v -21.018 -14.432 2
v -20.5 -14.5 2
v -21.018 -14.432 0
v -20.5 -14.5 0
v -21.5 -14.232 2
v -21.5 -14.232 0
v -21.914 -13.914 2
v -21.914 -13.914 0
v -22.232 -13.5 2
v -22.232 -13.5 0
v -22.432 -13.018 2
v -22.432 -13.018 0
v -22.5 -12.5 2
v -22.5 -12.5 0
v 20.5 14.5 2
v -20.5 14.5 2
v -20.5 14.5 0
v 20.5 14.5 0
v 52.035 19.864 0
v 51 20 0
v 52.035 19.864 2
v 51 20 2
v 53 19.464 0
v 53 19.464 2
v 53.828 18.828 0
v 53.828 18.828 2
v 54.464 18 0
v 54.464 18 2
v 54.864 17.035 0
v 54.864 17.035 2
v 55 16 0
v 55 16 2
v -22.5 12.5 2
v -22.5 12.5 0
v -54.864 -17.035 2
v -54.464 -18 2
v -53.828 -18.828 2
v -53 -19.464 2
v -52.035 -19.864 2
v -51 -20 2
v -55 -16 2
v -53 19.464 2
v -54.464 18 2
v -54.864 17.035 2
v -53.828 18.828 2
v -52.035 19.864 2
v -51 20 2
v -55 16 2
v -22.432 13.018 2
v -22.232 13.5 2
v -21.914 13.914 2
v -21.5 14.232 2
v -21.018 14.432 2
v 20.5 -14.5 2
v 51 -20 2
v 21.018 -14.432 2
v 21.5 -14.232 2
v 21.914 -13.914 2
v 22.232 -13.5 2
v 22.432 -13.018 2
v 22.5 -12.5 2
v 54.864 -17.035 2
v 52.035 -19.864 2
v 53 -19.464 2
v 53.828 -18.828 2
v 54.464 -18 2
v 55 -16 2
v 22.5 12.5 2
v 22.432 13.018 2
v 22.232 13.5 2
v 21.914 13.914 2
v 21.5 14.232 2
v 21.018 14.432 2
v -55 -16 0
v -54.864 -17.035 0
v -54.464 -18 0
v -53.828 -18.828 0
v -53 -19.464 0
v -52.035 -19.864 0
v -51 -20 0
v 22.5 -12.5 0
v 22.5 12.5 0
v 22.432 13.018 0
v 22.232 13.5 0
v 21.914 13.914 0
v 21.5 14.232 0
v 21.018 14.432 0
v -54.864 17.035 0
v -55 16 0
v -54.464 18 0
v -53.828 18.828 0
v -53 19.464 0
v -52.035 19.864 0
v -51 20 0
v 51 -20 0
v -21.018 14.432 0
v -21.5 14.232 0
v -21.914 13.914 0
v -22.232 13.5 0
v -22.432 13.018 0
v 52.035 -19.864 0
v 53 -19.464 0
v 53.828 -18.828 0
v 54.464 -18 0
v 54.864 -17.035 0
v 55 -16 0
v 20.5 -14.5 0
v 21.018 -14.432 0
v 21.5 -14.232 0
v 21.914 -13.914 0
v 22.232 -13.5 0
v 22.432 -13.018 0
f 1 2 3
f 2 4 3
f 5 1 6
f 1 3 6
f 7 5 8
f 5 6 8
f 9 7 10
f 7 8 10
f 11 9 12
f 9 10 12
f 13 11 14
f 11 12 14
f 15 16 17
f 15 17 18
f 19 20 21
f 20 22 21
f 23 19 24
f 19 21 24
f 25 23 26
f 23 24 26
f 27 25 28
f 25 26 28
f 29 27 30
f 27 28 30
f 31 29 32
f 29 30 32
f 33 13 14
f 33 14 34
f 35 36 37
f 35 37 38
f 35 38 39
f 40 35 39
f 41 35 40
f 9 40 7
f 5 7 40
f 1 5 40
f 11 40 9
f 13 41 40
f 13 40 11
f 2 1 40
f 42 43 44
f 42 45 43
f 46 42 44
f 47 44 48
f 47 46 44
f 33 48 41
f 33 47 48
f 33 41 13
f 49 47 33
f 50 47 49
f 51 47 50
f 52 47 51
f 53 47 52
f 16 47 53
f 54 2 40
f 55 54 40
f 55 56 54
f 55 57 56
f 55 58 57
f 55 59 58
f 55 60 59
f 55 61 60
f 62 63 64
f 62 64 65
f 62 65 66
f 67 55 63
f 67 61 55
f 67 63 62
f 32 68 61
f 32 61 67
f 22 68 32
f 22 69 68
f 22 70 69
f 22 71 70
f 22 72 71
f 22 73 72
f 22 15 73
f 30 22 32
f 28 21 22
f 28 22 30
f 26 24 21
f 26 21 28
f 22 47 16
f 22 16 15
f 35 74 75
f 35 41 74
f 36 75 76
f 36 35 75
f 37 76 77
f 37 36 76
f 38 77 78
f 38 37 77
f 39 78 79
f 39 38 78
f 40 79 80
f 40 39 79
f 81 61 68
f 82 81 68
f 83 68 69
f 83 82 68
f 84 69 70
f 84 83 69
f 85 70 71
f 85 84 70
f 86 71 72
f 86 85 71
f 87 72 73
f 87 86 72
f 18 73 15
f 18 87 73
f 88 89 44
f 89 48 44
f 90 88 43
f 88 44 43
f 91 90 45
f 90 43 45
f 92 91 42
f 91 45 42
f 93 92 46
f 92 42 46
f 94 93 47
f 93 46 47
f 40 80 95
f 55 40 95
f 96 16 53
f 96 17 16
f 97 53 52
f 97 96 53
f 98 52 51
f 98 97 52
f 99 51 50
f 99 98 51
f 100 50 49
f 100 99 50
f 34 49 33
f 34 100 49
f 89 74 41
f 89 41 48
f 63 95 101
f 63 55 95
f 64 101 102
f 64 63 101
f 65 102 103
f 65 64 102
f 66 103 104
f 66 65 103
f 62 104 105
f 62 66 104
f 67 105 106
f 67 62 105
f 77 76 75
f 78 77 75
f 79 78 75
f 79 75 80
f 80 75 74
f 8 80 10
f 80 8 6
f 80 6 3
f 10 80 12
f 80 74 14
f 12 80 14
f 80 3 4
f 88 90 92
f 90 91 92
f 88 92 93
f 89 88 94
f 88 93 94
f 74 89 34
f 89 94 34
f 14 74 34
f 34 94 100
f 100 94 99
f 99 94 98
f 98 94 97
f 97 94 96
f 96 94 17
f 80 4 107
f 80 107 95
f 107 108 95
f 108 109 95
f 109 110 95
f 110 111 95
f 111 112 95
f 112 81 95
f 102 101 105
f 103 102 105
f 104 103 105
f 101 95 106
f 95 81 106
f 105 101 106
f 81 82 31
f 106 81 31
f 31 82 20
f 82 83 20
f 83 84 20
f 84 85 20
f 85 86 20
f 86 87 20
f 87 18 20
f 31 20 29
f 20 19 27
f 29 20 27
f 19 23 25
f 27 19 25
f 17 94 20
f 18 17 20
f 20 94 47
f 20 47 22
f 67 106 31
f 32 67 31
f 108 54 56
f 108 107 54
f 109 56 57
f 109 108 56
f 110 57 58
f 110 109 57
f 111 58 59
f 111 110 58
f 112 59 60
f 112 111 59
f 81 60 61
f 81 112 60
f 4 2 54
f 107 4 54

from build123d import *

# Parameters (mm, degrees)
F0_W     = 110
F0_H     = 40
F1_DEPTH = 2
F2_W     = 45
F2_H     = 29
F3_DEPTH = 2.001
F4_R     = 2
F5_R     = 4


with BuildPart() as f1:
    # F0 (on Top) → F1 (new body)
    with BuildSketch(Plane.XY):
        Rectangle(F0_W, F0_H)
    extrude(amount=F1_DEPTH)

    # F2 (on face) → F3 (cut, through all)
    with BuildSketch(Plane.XY.offset(2)):
        Rectangle(F2_W, F2_H)
    extrude(amount=-F3_DEPTH, mode=Mode.SUBTRACT)

    # F4
    f4_edges = [f1.edges().sort_by_distance(p)[0] for p in [
        (-22.5, 14.5, 1),
        (22.5, 14.5, 1),
        (-22.5, -14.5, 1),
        (22.5, -14.5, 1),
    ]]
    fillet(f4_edges, radius=F4_R)

    # F5
    f5_edges = [f1.edges().sort_by_distance(p)[0] for p in [
        (-55, -20, 1),
        (-55, 20, 1),
        (55, 20, 1),
        (55, -20, 1),
    ]]
    fillet(f5_edges, radius=F5_R)


solid = f1.part
